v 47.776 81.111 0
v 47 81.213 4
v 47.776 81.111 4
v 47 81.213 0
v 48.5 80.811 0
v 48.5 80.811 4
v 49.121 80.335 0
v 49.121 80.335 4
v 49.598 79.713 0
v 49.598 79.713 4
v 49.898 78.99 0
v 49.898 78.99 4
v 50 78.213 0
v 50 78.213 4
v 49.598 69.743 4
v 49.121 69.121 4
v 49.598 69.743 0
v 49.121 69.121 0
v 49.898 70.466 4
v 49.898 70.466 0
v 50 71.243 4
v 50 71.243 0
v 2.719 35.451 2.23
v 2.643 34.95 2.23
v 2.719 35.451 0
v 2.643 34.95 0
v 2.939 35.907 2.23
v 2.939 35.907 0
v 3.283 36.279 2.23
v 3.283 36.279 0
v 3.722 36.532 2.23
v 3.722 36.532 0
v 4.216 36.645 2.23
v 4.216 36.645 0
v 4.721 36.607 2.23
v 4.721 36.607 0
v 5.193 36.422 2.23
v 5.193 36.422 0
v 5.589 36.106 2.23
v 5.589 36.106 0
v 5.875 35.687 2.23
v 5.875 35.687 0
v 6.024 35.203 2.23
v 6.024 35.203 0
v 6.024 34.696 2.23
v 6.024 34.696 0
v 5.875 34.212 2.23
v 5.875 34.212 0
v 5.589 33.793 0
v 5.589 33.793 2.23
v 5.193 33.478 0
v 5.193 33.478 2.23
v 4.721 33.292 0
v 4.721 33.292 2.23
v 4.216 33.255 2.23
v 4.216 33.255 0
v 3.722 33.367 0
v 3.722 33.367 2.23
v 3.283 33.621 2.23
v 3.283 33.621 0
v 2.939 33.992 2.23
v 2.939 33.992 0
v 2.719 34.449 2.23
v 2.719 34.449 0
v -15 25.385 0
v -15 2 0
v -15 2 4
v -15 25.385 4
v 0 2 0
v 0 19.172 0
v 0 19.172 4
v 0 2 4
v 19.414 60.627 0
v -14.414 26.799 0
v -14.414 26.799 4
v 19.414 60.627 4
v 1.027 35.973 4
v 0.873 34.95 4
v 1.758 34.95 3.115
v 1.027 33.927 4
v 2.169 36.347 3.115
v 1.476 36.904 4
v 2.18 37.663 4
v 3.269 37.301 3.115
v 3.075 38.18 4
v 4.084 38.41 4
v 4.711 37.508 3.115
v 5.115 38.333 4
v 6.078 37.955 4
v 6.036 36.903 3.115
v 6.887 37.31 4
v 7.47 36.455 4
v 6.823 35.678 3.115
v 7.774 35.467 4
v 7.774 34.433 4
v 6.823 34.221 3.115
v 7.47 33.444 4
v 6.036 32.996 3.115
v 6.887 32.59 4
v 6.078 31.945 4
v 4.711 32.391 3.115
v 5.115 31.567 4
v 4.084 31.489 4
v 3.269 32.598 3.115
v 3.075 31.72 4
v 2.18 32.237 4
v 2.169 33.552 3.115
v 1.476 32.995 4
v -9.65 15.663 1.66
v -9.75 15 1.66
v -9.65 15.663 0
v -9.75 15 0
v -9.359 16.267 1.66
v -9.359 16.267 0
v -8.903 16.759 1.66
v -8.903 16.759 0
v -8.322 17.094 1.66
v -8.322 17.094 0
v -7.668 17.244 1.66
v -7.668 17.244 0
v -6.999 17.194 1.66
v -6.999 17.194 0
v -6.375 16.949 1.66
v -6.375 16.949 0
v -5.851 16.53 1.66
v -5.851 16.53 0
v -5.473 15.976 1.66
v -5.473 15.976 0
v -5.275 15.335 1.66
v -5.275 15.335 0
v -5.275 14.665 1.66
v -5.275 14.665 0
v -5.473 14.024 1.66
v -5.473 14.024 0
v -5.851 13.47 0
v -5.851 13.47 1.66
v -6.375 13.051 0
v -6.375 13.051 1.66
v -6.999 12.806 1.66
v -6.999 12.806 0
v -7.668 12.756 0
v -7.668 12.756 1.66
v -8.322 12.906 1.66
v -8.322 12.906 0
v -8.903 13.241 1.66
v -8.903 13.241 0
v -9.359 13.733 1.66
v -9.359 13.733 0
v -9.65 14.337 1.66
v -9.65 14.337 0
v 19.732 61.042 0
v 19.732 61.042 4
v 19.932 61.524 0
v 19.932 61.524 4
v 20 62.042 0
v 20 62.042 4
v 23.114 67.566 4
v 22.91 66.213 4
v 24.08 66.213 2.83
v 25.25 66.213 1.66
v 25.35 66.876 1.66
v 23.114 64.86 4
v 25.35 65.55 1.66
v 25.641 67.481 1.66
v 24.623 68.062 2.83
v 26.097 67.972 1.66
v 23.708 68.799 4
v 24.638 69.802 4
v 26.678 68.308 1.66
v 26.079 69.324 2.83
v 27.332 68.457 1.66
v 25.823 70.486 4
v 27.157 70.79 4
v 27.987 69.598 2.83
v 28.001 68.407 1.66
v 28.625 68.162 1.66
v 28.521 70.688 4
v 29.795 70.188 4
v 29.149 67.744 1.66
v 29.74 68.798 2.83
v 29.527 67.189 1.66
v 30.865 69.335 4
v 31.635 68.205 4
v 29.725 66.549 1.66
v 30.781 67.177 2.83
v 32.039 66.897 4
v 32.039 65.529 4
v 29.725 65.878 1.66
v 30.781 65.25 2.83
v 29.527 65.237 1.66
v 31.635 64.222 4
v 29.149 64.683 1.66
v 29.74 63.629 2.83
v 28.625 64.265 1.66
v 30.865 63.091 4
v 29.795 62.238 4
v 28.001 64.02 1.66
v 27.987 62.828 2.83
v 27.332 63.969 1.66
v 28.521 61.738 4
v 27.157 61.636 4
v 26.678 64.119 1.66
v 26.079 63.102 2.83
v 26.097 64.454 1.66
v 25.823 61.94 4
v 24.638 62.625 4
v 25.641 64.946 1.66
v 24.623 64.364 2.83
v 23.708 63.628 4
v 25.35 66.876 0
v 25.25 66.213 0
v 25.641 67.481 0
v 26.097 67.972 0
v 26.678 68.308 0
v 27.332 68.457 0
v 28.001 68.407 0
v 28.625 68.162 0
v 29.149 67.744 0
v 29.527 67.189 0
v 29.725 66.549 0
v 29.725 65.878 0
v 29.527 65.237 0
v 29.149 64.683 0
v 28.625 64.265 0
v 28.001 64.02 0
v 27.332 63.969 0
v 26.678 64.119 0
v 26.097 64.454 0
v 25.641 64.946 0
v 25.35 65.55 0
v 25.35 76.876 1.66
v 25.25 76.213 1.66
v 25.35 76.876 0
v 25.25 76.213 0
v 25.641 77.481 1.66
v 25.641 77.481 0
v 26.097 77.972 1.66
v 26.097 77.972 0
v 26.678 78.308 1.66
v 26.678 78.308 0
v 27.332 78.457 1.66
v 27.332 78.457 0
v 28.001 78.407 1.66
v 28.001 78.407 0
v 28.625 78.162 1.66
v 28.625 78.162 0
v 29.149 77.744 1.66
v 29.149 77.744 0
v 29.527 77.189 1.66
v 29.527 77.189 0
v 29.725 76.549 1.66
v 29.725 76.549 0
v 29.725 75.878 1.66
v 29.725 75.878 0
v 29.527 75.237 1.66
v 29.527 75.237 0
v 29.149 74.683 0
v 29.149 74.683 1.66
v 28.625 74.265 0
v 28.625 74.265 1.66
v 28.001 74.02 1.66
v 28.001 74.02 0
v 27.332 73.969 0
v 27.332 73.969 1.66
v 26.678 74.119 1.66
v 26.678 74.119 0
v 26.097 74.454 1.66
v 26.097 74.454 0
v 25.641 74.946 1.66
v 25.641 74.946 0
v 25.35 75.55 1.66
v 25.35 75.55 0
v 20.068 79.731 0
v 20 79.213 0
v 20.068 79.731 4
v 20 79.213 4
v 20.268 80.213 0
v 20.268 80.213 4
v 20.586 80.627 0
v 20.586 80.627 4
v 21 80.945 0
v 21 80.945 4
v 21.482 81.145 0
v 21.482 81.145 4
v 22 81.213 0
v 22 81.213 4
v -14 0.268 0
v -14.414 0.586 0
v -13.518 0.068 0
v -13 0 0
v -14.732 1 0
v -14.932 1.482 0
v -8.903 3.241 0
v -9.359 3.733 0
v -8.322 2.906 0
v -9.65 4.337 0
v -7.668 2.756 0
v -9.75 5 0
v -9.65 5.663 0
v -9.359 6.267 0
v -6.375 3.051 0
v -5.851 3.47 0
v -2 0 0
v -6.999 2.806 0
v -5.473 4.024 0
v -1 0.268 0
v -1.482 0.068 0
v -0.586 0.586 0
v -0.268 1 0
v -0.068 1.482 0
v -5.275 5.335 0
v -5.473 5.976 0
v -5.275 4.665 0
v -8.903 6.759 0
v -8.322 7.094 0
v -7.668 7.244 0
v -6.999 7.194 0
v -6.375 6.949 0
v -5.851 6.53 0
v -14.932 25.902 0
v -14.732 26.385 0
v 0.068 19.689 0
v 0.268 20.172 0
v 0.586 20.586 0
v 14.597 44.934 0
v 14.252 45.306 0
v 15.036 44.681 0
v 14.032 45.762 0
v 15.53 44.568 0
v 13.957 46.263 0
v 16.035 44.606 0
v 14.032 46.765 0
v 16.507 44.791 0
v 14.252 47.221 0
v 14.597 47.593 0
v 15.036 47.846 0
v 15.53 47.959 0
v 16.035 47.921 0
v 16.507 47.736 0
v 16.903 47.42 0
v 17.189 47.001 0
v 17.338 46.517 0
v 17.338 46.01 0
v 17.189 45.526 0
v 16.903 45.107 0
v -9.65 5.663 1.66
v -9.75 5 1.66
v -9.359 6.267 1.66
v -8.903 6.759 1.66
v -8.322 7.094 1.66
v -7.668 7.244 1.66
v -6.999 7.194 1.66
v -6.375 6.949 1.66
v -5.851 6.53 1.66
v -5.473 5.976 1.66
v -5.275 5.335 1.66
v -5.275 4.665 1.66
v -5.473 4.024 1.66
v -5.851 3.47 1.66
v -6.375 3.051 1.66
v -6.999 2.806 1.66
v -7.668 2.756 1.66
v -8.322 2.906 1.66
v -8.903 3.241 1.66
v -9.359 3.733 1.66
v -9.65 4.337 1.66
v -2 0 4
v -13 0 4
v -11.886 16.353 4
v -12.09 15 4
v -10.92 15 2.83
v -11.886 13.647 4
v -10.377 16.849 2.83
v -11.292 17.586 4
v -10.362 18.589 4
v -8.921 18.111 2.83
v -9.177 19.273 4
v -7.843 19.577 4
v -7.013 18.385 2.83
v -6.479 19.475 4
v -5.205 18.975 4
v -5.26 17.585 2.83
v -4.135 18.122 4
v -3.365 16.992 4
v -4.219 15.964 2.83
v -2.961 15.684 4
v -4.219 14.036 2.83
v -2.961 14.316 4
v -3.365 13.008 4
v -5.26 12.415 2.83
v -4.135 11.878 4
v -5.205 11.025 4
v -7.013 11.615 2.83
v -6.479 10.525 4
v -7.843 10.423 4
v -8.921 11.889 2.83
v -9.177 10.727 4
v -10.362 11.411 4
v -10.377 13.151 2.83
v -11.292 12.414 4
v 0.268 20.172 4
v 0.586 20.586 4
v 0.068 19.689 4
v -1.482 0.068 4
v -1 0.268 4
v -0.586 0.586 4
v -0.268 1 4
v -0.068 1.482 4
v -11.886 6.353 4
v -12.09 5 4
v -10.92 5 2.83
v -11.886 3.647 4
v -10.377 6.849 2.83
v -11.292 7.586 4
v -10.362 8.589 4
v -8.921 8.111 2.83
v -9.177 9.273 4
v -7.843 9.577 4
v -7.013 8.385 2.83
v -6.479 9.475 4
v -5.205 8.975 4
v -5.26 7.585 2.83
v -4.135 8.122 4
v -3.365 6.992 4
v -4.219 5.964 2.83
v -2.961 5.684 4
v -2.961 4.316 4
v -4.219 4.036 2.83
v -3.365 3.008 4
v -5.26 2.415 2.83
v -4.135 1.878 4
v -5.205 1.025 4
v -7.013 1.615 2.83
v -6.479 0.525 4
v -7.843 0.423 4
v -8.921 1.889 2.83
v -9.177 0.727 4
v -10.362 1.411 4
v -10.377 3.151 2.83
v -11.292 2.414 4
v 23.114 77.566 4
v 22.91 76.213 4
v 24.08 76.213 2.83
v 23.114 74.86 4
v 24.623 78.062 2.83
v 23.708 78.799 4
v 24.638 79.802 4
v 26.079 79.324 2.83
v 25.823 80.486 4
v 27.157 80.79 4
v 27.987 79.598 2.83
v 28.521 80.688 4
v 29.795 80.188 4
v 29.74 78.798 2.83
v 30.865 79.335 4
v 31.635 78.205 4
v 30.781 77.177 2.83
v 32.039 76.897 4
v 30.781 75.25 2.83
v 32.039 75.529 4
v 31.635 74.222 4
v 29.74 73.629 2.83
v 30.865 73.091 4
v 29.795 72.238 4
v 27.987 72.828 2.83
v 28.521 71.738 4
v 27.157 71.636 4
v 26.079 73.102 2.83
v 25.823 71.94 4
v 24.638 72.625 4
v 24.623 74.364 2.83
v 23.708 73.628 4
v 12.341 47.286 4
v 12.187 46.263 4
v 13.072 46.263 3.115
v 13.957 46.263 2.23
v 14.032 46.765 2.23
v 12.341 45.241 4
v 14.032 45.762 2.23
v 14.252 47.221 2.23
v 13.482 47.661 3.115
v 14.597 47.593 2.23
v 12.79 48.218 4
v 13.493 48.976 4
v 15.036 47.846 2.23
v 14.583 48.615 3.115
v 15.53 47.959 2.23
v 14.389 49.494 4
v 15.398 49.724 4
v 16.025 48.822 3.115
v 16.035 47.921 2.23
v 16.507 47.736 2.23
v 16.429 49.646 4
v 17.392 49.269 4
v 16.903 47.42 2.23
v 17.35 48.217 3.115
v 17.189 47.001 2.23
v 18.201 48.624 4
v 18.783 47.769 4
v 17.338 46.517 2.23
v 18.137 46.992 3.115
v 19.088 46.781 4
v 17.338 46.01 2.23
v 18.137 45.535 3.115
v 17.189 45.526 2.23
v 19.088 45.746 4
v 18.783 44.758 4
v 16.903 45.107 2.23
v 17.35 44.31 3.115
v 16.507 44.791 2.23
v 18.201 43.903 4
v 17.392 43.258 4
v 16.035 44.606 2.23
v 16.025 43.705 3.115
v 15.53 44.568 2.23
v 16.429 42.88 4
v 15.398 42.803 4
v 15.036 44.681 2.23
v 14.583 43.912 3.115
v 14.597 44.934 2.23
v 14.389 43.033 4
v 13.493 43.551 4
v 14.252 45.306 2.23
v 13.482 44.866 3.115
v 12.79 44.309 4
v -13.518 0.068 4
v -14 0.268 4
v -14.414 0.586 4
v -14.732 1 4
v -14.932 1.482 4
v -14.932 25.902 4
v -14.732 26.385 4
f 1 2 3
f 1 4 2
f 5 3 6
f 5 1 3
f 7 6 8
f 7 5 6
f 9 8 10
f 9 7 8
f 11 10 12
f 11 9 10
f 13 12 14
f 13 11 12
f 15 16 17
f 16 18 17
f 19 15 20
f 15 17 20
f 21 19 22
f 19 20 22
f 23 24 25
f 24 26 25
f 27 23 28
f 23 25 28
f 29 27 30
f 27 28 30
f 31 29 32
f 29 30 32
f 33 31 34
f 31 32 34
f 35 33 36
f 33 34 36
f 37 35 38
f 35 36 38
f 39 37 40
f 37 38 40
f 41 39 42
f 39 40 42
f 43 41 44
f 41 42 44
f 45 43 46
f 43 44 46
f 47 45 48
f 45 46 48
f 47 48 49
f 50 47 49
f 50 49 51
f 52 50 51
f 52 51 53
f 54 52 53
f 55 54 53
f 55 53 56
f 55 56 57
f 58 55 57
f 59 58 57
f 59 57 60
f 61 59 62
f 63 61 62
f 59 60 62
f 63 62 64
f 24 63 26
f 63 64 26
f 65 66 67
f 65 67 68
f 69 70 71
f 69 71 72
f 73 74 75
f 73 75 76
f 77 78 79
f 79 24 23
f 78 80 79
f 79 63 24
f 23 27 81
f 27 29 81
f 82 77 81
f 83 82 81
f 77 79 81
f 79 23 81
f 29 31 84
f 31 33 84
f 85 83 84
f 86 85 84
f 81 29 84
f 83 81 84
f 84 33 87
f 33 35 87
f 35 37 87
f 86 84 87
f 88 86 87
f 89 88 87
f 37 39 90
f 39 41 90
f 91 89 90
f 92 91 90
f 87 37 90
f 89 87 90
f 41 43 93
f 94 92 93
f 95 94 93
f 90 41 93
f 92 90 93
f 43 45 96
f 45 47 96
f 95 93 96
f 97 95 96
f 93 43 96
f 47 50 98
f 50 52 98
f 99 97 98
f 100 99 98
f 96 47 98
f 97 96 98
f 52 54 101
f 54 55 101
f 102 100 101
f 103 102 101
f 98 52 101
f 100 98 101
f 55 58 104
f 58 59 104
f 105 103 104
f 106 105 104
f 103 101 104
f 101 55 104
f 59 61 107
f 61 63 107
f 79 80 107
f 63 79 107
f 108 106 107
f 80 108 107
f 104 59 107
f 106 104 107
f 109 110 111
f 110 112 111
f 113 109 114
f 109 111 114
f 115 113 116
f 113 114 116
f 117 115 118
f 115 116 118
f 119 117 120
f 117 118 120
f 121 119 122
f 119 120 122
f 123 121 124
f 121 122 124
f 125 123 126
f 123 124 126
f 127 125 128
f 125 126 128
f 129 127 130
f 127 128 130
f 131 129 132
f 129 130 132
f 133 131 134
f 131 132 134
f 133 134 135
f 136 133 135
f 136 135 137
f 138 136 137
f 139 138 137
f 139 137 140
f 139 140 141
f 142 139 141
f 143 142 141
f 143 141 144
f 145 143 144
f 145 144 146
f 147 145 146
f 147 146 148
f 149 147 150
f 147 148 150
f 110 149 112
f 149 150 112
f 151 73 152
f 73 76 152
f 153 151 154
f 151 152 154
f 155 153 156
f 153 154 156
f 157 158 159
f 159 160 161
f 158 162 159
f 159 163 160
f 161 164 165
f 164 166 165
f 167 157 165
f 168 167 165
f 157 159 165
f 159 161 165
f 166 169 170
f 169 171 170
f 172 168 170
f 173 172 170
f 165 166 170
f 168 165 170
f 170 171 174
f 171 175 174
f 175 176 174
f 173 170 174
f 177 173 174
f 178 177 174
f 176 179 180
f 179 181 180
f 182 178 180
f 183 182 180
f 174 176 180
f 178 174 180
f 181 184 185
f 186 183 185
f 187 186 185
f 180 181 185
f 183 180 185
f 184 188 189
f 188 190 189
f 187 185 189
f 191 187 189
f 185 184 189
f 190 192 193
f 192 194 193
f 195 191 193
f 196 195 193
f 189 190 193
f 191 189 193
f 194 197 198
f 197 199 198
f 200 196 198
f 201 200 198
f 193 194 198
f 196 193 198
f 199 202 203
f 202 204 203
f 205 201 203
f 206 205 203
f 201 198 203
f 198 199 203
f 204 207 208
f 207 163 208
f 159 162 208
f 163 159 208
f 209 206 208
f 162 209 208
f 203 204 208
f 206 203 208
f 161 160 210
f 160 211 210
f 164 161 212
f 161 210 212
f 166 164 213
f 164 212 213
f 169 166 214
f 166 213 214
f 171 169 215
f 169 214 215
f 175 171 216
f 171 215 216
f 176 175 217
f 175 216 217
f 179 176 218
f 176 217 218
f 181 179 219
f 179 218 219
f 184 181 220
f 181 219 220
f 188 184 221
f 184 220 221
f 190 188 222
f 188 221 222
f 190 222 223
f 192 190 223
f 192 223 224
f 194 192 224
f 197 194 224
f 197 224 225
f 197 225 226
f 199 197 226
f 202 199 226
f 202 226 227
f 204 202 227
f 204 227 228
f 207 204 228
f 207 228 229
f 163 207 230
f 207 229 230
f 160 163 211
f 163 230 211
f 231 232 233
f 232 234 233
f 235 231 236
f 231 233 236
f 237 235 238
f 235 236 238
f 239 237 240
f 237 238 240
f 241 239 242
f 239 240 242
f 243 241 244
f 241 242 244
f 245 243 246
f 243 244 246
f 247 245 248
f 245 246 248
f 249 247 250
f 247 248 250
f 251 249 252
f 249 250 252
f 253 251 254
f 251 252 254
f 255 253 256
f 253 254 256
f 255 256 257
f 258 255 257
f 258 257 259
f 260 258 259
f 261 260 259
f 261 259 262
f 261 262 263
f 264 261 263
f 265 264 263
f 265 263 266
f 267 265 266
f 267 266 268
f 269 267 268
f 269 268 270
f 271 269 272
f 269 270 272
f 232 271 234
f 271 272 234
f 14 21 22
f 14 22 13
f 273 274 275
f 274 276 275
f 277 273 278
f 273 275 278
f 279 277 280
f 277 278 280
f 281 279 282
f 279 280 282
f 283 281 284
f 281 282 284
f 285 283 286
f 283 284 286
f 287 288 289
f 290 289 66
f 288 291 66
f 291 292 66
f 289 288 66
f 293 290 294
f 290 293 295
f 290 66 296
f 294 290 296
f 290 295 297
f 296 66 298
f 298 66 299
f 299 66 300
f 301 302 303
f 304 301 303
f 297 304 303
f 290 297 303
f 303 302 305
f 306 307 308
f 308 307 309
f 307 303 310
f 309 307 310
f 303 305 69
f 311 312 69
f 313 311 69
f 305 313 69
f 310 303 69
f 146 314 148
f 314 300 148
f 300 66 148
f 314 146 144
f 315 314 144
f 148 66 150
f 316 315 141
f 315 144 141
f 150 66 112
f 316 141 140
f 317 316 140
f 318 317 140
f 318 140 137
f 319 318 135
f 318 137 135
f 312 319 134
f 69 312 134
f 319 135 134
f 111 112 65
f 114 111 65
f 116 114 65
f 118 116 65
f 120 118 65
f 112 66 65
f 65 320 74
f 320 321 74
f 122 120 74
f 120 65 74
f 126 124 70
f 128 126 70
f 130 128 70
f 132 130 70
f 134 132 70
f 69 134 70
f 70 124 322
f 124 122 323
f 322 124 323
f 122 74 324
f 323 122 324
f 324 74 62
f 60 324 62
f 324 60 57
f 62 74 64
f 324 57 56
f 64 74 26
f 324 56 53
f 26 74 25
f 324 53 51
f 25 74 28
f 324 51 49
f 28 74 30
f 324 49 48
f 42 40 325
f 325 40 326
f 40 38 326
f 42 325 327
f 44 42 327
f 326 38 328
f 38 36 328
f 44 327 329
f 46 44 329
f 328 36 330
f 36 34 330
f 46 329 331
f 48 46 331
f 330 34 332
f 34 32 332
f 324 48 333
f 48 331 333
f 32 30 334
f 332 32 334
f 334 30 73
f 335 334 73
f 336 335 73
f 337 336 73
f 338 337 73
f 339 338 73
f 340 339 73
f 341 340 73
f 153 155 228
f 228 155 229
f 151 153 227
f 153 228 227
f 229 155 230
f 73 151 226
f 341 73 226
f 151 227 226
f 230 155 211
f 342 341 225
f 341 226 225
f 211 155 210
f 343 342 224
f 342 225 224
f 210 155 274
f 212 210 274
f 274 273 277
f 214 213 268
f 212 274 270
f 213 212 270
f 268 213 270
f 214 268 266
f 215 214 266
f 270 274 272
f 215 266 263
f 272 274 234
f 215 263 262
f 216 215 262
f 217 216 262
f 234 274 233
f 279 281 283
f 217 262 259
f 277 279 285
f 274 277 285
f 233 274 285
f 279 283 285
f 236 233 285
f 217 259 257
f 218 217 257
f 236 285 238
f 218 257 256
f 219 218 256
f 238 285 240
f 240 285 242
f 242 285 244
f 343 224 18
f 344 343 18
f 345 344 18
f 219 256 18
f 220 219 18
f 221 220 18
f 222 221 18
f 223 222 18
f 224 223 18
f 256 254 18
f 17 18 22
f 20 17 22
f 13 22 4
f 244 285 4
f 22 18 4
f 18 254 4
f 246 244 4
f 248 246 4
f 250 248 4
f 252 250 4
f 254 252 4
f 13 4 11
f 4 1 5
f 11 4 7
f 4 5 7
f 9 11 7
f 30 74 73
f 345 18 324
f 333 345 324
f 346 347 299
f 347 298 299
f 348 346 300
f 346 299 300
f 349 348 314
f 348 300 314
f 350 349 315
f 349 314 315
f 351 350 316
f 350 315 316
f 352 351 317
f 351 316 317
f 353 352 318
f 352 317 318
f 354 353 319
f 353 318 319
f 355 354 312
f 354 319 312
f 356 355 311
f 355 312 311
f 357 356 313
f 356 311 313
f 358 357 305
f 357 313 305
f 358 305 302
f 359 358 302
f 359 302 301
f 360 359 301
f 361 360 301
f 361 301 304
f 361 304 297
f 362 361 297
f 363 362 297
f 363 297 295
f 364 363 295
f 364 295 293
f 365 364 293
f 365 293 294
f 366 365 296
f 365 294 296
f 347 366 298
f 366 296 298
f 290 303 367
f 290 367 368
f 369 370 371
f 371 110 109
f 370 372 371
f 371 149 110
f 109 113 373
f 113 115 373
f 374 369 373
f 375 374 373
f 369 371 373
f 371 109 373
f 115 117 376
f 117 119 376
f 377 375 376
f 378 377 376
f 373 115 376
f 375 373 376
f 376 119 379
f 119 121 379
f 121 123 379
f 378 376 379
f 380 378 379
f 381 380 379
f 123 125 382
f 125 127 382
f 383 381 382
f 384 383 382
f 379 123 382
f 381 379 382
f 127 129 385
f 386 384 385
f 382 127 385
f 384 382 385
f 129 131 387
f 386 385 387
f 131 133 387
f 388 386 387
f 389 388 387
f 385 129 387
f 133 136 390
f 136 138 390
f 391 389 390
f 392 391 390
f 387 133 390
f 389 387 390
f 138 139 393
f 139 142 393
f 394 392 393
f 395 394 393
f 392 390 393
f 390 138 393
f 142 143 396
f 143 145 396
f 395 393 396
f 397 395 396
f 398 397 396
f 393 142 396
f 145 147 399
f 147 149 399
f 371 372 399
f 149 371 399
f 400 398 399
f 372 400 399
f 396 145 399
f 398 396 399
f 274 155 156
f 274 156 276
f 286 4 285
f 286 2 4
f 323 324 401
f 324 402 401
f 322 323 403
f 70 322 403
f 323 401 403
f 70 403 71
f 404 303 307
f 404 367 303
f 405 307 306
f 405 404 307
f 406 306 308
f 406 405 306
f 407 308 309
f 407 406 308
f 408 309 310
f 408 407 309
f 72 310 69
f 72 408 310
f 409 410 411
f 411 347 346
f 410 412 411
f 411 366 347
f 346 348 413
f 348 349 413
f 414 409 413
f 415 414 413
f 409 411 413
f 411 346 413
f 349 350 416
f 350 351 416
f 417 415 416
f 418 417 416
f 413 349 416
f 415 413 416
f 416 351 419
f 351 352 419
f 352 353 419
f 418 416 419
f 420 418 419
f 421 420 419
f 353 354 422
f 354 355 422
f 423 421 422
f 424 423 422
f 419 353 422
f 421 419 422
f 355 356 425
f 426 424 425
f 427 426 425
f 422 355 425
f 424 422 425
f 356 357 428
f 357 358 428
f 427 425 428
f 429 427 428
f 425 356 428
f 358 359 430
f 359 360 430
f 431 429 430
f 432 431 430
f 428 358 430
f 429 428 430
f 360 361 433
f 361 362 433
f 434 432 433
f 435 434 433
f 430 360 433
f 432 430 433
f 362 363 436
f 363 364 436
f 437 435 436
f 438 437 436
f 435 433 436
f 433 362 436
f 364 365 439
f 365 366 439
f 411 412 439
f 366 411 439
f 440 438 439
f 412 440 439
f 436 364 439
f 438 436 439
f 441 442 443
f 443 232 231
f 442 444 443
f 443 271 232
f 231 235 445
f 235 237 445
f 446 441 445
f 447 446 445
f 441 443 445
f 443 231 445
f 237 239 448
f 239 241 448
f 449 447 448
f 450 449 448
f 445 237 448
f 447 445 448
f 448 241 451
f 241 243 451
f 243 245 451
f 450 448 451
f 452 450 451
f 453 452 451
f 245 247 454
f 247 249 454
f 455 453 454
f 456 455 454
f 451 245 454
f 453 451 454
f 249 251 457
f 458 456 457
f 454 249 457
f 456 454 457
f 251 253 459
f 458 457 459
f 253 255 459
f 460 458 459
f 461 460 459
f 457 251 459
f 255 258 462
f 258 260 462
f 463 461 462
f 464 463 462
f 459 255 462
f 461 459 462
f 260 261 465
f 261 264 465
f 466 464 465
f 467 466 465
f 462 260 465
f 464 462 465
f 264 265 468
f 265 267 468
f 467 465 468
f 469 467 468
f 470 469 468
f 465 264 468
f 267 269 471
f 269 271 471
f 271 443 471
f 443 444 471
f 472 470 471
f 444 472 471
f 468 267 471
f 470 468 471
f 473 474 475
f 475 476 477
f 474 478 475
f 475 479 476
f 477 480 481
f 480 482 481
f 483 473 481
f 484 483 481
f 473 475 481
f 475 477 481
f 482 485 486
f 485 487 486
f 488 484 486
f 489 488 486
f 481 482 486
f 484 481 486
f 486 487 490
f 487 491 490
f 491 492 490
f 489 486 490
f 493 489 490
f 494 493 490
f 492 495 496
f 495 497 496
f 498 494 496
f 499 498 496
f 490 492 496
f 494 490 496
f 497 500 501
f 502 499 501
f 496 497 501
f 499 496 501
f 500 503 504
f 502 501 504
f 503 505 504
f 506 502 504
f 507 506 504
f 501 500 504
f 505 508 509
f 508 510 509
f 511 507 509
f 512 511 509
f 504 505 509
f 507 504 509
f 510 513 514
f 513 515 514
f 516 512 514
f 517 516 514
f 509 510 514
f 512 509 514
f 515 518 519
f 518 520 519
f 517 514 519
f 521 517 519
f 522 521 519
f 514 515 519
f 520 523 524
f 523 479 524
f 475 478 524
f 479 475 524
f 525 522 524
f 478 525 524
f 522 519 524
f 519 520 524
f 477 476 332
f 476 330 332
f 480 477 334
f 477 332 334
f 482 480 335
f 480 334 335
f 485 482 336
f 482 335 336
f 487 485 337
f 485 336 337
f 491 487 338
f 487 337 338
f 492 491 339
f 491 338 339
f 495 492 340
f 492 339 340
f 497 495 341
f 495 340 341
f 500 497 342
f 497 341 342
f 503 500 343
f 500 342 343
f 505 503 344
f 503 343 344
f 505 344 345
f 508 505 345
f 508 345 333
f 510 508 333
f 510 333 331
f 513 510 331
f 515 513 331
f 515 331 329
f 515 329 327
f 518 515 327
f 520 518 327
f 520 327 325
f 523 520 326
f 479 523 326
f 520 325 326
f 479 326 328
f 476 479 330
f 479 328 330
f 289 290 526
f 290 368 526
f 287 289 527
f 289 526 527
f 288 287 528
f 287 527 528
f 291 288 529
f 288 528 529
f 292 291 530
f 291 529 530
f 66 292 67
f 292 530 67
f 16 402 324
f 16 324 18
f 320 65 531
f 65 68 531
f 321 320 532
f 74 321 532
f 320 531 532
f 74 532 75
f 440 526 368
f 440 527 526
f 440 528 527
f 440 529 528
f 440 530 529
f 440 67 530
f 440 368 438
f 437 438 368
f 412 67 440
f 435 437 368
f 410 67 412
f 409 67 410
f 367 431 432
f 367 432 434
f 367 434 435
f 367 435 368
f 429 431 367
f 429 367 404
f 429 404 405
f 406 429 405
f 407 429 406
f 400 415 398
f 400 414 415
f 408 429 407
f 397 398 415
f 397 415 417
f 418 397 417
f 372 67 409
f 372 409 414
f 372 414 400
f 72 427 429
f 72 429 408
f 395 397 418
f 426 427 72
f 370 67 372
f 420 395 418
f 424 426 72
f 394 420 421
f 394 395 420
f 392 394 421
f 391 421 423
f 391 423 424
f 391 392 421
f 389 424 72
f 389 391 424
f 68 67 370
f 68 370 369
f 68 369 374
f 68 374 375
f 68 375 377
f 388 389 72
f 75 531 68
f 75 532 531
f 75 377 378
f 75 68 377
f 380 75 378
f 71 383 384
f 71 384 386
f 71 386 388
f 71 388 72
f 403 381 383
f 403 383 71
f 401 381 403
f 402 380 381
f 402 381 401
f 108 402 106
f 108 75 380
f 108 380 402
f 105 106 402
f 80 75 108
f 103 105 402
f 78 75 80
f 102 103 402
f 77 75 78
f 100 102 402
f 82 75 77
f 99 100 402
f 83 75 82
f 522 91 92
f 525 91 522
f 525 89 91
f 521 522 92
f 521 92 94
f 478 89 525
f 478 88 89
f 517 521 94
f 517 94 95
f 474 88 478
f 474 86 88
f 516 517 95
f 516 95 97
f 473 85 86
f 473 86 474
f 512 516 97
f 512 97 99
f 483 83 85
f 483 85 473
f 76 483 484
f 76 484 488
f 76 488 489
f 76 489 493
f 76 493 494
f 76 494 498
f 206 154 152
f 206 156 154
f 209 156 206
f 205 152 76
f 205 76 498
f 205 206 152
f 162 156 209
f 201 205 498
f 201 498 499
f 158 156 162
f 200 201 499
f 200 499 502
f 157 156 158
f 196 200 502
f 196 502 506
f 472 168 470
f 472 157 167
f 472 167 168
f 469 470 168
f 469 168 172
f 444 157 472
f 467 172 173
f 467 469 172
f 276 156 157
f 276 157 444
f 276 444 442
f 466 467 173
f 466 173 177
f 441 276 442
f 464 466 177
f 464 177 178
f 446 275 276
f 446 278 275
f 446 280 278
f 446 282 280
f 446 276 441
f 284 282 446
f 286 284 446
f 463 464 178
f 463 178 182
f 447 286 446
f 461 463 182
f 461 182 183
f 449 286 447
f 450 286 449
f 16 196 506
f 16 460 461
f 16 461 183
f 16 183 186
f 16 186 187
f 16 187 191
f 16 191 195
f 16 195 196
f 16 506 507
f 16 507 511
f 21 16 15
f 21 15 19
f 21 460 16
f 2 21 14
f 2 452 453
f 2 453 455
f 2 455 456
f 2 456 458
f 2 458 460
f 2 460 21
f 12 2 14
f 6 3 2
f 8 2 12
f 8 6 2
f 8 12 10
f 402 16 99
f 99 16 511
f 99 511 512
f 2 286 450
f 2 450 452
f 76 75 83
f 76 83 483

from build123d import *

# Parameters (mm, degrees)
EXTRUDE_1_DEPTH              = 4
FILLET_1_R                   = 2
HOLE_WIZARD_M4_1_D           = 4.5
HOLE_WIZARD_M4_1_DEPTH       = 24.5
HOLE_WIZARD_M4_1_CSINK_D     = 9.18
HOLE_WIZARD_M4_1_CSINK_ANGLE = 90
HOLE_WIZARD_M4_1_TIP         = 1.351936393
HOLE_WIZARD_M3_1_D           = 3.4
HOLE_WIZARD_M3_1_DEPTH       = 24.5
HOLE_WIZARD_M3_1_CSINK_D     = 6.94
HOLE_WIZARD_M3_1_CSINK_ANGLE = 90
HOLE_WIZARD_M3_1_TIP         = 1.021463052
EXTRUDE_2_DEPTH              = 4
FILLET_2_R                   = 3


with BuildPart() as part:
    # 草图1 → 凸台-拉伸1 (new body)
    with BuildSketch(Plane.XY):
        Polygon((0, 0), (-15, 0), (-15, 26.213203436), (20, 61.213203436), (20, 81.213203436), (35, 81.213203436), (35, 55), (0, 20), align=None)
    extrude(amount=EXTRUDE_1_DEPTH)

    # 圆角1
    fillet_1_edges = [part.edges().sort_by_distance(p)[0] for p in [
        (0, 0, 2),
        (-15, 0, 2),
        (-15, 26.213203436, 2),
        (20, 61.213203436, 2),
        (20, 81.213203436, 2),
        (35, 81.213203436, 2),
        (35, 55, 2),
        (0, 20, 2),
    ]]
    fillet(fillet_1_edges, radius=FILLET_1_R)

    # M4 六角凹锥坑头螺钉的锥形沉头孔1
    with Locations(Plane(origin=(27.5, 76.213203436, 4), x_dir=(1, 0, 0), z_dir=(0, 0, 1))):
        with Locations((0, 0), (0, -10), (-35, -61.213203436), (-35, -71.213203436)):
            CounterSinkHole(HOLE_WIZARD_M4_1_D / 2, HOLE_WIZARD_M4_1_CSINK_D / 2, depth=HOLE_WIZARD_M4_1_DEPTH, counter_sink_angle=HOLE_WIZARD_M4_1_CSINK_ANGLE)
            with Locations((0, 0, -(HOLE_WIZARD_M4_1_DEPTH + HOLE_WIZARD_M4_1_TIP / 2))):  # 118° drill point
                Cone(0, HOLE_WIZARD_M4_1_D / 2, HOLE_WIZARD_M4_1_TIP, mode=Mode.SUBTRACT)

    # M3 六角凹锥坑头螺钉的锥形沉头孔1
    with Locations(Plane(origin=(4.343145751, 34.949747468, 4), x_dir=(1, 0, 0), z_dir=(0, 0, 1))):
        with Locations((0, 0), (11.313708498, 11.313708499)):
            CounterSinkHole(HOLE_WIZARD_M3_1_D / 2, HOLE_WIZARD_M3_1_CSINK_D / 2, depth=HOLE_WIZARD_M3_1_DEPTH, counter_sink_angle=HOLE_WIZARD_M3_1_CSINK_ANGLE)
            with Locations((0, 0, -(HOLE_WIZARD_M3_1_DEPTH + HOLE_WIZARD_M3_1_TIP / 2))):  # 118° drill point
                Cone(0, HOLE_WIZARD_M3_1_D / 2, HOLE_WIZARD_M3_1_TIP, mode=Mode.SUBTRACT)

    # 草图6 → 凸台-拉伸2 (add)
    with BuildSketch(Plane.XY.offset(4)):
        with BuildLine():
            Line((34.414213562, 54.414213562), (50, 70))
            Line((50, 70), (50, 81.213203436))
            Line((50, 81.213203436), (33, 81.213203436))
            ThreePointArc((33, 81.213203436), (34.414213562, 80.627416998), (35, 79.213203436))
            Line((35, 79.213203436), (35, 55.828427125))
            ThreePointArc((35, 55.828427125), (34.847759065, 55.06306026), (34.414213562, 54.414213562))
        make_face()
    extrude(amount=-EXTRUDE_2_DEPTH)

    # 圆角2
    fillet_2_edges = [part.edges().sort_by_distance(p)[0] for p in [
        (50, 70, 2),
        (50, 81.213203436, 2),
    ]]
    fillet(fillet_2_edges, radius=FILLET_2_R)


solid = part.part
